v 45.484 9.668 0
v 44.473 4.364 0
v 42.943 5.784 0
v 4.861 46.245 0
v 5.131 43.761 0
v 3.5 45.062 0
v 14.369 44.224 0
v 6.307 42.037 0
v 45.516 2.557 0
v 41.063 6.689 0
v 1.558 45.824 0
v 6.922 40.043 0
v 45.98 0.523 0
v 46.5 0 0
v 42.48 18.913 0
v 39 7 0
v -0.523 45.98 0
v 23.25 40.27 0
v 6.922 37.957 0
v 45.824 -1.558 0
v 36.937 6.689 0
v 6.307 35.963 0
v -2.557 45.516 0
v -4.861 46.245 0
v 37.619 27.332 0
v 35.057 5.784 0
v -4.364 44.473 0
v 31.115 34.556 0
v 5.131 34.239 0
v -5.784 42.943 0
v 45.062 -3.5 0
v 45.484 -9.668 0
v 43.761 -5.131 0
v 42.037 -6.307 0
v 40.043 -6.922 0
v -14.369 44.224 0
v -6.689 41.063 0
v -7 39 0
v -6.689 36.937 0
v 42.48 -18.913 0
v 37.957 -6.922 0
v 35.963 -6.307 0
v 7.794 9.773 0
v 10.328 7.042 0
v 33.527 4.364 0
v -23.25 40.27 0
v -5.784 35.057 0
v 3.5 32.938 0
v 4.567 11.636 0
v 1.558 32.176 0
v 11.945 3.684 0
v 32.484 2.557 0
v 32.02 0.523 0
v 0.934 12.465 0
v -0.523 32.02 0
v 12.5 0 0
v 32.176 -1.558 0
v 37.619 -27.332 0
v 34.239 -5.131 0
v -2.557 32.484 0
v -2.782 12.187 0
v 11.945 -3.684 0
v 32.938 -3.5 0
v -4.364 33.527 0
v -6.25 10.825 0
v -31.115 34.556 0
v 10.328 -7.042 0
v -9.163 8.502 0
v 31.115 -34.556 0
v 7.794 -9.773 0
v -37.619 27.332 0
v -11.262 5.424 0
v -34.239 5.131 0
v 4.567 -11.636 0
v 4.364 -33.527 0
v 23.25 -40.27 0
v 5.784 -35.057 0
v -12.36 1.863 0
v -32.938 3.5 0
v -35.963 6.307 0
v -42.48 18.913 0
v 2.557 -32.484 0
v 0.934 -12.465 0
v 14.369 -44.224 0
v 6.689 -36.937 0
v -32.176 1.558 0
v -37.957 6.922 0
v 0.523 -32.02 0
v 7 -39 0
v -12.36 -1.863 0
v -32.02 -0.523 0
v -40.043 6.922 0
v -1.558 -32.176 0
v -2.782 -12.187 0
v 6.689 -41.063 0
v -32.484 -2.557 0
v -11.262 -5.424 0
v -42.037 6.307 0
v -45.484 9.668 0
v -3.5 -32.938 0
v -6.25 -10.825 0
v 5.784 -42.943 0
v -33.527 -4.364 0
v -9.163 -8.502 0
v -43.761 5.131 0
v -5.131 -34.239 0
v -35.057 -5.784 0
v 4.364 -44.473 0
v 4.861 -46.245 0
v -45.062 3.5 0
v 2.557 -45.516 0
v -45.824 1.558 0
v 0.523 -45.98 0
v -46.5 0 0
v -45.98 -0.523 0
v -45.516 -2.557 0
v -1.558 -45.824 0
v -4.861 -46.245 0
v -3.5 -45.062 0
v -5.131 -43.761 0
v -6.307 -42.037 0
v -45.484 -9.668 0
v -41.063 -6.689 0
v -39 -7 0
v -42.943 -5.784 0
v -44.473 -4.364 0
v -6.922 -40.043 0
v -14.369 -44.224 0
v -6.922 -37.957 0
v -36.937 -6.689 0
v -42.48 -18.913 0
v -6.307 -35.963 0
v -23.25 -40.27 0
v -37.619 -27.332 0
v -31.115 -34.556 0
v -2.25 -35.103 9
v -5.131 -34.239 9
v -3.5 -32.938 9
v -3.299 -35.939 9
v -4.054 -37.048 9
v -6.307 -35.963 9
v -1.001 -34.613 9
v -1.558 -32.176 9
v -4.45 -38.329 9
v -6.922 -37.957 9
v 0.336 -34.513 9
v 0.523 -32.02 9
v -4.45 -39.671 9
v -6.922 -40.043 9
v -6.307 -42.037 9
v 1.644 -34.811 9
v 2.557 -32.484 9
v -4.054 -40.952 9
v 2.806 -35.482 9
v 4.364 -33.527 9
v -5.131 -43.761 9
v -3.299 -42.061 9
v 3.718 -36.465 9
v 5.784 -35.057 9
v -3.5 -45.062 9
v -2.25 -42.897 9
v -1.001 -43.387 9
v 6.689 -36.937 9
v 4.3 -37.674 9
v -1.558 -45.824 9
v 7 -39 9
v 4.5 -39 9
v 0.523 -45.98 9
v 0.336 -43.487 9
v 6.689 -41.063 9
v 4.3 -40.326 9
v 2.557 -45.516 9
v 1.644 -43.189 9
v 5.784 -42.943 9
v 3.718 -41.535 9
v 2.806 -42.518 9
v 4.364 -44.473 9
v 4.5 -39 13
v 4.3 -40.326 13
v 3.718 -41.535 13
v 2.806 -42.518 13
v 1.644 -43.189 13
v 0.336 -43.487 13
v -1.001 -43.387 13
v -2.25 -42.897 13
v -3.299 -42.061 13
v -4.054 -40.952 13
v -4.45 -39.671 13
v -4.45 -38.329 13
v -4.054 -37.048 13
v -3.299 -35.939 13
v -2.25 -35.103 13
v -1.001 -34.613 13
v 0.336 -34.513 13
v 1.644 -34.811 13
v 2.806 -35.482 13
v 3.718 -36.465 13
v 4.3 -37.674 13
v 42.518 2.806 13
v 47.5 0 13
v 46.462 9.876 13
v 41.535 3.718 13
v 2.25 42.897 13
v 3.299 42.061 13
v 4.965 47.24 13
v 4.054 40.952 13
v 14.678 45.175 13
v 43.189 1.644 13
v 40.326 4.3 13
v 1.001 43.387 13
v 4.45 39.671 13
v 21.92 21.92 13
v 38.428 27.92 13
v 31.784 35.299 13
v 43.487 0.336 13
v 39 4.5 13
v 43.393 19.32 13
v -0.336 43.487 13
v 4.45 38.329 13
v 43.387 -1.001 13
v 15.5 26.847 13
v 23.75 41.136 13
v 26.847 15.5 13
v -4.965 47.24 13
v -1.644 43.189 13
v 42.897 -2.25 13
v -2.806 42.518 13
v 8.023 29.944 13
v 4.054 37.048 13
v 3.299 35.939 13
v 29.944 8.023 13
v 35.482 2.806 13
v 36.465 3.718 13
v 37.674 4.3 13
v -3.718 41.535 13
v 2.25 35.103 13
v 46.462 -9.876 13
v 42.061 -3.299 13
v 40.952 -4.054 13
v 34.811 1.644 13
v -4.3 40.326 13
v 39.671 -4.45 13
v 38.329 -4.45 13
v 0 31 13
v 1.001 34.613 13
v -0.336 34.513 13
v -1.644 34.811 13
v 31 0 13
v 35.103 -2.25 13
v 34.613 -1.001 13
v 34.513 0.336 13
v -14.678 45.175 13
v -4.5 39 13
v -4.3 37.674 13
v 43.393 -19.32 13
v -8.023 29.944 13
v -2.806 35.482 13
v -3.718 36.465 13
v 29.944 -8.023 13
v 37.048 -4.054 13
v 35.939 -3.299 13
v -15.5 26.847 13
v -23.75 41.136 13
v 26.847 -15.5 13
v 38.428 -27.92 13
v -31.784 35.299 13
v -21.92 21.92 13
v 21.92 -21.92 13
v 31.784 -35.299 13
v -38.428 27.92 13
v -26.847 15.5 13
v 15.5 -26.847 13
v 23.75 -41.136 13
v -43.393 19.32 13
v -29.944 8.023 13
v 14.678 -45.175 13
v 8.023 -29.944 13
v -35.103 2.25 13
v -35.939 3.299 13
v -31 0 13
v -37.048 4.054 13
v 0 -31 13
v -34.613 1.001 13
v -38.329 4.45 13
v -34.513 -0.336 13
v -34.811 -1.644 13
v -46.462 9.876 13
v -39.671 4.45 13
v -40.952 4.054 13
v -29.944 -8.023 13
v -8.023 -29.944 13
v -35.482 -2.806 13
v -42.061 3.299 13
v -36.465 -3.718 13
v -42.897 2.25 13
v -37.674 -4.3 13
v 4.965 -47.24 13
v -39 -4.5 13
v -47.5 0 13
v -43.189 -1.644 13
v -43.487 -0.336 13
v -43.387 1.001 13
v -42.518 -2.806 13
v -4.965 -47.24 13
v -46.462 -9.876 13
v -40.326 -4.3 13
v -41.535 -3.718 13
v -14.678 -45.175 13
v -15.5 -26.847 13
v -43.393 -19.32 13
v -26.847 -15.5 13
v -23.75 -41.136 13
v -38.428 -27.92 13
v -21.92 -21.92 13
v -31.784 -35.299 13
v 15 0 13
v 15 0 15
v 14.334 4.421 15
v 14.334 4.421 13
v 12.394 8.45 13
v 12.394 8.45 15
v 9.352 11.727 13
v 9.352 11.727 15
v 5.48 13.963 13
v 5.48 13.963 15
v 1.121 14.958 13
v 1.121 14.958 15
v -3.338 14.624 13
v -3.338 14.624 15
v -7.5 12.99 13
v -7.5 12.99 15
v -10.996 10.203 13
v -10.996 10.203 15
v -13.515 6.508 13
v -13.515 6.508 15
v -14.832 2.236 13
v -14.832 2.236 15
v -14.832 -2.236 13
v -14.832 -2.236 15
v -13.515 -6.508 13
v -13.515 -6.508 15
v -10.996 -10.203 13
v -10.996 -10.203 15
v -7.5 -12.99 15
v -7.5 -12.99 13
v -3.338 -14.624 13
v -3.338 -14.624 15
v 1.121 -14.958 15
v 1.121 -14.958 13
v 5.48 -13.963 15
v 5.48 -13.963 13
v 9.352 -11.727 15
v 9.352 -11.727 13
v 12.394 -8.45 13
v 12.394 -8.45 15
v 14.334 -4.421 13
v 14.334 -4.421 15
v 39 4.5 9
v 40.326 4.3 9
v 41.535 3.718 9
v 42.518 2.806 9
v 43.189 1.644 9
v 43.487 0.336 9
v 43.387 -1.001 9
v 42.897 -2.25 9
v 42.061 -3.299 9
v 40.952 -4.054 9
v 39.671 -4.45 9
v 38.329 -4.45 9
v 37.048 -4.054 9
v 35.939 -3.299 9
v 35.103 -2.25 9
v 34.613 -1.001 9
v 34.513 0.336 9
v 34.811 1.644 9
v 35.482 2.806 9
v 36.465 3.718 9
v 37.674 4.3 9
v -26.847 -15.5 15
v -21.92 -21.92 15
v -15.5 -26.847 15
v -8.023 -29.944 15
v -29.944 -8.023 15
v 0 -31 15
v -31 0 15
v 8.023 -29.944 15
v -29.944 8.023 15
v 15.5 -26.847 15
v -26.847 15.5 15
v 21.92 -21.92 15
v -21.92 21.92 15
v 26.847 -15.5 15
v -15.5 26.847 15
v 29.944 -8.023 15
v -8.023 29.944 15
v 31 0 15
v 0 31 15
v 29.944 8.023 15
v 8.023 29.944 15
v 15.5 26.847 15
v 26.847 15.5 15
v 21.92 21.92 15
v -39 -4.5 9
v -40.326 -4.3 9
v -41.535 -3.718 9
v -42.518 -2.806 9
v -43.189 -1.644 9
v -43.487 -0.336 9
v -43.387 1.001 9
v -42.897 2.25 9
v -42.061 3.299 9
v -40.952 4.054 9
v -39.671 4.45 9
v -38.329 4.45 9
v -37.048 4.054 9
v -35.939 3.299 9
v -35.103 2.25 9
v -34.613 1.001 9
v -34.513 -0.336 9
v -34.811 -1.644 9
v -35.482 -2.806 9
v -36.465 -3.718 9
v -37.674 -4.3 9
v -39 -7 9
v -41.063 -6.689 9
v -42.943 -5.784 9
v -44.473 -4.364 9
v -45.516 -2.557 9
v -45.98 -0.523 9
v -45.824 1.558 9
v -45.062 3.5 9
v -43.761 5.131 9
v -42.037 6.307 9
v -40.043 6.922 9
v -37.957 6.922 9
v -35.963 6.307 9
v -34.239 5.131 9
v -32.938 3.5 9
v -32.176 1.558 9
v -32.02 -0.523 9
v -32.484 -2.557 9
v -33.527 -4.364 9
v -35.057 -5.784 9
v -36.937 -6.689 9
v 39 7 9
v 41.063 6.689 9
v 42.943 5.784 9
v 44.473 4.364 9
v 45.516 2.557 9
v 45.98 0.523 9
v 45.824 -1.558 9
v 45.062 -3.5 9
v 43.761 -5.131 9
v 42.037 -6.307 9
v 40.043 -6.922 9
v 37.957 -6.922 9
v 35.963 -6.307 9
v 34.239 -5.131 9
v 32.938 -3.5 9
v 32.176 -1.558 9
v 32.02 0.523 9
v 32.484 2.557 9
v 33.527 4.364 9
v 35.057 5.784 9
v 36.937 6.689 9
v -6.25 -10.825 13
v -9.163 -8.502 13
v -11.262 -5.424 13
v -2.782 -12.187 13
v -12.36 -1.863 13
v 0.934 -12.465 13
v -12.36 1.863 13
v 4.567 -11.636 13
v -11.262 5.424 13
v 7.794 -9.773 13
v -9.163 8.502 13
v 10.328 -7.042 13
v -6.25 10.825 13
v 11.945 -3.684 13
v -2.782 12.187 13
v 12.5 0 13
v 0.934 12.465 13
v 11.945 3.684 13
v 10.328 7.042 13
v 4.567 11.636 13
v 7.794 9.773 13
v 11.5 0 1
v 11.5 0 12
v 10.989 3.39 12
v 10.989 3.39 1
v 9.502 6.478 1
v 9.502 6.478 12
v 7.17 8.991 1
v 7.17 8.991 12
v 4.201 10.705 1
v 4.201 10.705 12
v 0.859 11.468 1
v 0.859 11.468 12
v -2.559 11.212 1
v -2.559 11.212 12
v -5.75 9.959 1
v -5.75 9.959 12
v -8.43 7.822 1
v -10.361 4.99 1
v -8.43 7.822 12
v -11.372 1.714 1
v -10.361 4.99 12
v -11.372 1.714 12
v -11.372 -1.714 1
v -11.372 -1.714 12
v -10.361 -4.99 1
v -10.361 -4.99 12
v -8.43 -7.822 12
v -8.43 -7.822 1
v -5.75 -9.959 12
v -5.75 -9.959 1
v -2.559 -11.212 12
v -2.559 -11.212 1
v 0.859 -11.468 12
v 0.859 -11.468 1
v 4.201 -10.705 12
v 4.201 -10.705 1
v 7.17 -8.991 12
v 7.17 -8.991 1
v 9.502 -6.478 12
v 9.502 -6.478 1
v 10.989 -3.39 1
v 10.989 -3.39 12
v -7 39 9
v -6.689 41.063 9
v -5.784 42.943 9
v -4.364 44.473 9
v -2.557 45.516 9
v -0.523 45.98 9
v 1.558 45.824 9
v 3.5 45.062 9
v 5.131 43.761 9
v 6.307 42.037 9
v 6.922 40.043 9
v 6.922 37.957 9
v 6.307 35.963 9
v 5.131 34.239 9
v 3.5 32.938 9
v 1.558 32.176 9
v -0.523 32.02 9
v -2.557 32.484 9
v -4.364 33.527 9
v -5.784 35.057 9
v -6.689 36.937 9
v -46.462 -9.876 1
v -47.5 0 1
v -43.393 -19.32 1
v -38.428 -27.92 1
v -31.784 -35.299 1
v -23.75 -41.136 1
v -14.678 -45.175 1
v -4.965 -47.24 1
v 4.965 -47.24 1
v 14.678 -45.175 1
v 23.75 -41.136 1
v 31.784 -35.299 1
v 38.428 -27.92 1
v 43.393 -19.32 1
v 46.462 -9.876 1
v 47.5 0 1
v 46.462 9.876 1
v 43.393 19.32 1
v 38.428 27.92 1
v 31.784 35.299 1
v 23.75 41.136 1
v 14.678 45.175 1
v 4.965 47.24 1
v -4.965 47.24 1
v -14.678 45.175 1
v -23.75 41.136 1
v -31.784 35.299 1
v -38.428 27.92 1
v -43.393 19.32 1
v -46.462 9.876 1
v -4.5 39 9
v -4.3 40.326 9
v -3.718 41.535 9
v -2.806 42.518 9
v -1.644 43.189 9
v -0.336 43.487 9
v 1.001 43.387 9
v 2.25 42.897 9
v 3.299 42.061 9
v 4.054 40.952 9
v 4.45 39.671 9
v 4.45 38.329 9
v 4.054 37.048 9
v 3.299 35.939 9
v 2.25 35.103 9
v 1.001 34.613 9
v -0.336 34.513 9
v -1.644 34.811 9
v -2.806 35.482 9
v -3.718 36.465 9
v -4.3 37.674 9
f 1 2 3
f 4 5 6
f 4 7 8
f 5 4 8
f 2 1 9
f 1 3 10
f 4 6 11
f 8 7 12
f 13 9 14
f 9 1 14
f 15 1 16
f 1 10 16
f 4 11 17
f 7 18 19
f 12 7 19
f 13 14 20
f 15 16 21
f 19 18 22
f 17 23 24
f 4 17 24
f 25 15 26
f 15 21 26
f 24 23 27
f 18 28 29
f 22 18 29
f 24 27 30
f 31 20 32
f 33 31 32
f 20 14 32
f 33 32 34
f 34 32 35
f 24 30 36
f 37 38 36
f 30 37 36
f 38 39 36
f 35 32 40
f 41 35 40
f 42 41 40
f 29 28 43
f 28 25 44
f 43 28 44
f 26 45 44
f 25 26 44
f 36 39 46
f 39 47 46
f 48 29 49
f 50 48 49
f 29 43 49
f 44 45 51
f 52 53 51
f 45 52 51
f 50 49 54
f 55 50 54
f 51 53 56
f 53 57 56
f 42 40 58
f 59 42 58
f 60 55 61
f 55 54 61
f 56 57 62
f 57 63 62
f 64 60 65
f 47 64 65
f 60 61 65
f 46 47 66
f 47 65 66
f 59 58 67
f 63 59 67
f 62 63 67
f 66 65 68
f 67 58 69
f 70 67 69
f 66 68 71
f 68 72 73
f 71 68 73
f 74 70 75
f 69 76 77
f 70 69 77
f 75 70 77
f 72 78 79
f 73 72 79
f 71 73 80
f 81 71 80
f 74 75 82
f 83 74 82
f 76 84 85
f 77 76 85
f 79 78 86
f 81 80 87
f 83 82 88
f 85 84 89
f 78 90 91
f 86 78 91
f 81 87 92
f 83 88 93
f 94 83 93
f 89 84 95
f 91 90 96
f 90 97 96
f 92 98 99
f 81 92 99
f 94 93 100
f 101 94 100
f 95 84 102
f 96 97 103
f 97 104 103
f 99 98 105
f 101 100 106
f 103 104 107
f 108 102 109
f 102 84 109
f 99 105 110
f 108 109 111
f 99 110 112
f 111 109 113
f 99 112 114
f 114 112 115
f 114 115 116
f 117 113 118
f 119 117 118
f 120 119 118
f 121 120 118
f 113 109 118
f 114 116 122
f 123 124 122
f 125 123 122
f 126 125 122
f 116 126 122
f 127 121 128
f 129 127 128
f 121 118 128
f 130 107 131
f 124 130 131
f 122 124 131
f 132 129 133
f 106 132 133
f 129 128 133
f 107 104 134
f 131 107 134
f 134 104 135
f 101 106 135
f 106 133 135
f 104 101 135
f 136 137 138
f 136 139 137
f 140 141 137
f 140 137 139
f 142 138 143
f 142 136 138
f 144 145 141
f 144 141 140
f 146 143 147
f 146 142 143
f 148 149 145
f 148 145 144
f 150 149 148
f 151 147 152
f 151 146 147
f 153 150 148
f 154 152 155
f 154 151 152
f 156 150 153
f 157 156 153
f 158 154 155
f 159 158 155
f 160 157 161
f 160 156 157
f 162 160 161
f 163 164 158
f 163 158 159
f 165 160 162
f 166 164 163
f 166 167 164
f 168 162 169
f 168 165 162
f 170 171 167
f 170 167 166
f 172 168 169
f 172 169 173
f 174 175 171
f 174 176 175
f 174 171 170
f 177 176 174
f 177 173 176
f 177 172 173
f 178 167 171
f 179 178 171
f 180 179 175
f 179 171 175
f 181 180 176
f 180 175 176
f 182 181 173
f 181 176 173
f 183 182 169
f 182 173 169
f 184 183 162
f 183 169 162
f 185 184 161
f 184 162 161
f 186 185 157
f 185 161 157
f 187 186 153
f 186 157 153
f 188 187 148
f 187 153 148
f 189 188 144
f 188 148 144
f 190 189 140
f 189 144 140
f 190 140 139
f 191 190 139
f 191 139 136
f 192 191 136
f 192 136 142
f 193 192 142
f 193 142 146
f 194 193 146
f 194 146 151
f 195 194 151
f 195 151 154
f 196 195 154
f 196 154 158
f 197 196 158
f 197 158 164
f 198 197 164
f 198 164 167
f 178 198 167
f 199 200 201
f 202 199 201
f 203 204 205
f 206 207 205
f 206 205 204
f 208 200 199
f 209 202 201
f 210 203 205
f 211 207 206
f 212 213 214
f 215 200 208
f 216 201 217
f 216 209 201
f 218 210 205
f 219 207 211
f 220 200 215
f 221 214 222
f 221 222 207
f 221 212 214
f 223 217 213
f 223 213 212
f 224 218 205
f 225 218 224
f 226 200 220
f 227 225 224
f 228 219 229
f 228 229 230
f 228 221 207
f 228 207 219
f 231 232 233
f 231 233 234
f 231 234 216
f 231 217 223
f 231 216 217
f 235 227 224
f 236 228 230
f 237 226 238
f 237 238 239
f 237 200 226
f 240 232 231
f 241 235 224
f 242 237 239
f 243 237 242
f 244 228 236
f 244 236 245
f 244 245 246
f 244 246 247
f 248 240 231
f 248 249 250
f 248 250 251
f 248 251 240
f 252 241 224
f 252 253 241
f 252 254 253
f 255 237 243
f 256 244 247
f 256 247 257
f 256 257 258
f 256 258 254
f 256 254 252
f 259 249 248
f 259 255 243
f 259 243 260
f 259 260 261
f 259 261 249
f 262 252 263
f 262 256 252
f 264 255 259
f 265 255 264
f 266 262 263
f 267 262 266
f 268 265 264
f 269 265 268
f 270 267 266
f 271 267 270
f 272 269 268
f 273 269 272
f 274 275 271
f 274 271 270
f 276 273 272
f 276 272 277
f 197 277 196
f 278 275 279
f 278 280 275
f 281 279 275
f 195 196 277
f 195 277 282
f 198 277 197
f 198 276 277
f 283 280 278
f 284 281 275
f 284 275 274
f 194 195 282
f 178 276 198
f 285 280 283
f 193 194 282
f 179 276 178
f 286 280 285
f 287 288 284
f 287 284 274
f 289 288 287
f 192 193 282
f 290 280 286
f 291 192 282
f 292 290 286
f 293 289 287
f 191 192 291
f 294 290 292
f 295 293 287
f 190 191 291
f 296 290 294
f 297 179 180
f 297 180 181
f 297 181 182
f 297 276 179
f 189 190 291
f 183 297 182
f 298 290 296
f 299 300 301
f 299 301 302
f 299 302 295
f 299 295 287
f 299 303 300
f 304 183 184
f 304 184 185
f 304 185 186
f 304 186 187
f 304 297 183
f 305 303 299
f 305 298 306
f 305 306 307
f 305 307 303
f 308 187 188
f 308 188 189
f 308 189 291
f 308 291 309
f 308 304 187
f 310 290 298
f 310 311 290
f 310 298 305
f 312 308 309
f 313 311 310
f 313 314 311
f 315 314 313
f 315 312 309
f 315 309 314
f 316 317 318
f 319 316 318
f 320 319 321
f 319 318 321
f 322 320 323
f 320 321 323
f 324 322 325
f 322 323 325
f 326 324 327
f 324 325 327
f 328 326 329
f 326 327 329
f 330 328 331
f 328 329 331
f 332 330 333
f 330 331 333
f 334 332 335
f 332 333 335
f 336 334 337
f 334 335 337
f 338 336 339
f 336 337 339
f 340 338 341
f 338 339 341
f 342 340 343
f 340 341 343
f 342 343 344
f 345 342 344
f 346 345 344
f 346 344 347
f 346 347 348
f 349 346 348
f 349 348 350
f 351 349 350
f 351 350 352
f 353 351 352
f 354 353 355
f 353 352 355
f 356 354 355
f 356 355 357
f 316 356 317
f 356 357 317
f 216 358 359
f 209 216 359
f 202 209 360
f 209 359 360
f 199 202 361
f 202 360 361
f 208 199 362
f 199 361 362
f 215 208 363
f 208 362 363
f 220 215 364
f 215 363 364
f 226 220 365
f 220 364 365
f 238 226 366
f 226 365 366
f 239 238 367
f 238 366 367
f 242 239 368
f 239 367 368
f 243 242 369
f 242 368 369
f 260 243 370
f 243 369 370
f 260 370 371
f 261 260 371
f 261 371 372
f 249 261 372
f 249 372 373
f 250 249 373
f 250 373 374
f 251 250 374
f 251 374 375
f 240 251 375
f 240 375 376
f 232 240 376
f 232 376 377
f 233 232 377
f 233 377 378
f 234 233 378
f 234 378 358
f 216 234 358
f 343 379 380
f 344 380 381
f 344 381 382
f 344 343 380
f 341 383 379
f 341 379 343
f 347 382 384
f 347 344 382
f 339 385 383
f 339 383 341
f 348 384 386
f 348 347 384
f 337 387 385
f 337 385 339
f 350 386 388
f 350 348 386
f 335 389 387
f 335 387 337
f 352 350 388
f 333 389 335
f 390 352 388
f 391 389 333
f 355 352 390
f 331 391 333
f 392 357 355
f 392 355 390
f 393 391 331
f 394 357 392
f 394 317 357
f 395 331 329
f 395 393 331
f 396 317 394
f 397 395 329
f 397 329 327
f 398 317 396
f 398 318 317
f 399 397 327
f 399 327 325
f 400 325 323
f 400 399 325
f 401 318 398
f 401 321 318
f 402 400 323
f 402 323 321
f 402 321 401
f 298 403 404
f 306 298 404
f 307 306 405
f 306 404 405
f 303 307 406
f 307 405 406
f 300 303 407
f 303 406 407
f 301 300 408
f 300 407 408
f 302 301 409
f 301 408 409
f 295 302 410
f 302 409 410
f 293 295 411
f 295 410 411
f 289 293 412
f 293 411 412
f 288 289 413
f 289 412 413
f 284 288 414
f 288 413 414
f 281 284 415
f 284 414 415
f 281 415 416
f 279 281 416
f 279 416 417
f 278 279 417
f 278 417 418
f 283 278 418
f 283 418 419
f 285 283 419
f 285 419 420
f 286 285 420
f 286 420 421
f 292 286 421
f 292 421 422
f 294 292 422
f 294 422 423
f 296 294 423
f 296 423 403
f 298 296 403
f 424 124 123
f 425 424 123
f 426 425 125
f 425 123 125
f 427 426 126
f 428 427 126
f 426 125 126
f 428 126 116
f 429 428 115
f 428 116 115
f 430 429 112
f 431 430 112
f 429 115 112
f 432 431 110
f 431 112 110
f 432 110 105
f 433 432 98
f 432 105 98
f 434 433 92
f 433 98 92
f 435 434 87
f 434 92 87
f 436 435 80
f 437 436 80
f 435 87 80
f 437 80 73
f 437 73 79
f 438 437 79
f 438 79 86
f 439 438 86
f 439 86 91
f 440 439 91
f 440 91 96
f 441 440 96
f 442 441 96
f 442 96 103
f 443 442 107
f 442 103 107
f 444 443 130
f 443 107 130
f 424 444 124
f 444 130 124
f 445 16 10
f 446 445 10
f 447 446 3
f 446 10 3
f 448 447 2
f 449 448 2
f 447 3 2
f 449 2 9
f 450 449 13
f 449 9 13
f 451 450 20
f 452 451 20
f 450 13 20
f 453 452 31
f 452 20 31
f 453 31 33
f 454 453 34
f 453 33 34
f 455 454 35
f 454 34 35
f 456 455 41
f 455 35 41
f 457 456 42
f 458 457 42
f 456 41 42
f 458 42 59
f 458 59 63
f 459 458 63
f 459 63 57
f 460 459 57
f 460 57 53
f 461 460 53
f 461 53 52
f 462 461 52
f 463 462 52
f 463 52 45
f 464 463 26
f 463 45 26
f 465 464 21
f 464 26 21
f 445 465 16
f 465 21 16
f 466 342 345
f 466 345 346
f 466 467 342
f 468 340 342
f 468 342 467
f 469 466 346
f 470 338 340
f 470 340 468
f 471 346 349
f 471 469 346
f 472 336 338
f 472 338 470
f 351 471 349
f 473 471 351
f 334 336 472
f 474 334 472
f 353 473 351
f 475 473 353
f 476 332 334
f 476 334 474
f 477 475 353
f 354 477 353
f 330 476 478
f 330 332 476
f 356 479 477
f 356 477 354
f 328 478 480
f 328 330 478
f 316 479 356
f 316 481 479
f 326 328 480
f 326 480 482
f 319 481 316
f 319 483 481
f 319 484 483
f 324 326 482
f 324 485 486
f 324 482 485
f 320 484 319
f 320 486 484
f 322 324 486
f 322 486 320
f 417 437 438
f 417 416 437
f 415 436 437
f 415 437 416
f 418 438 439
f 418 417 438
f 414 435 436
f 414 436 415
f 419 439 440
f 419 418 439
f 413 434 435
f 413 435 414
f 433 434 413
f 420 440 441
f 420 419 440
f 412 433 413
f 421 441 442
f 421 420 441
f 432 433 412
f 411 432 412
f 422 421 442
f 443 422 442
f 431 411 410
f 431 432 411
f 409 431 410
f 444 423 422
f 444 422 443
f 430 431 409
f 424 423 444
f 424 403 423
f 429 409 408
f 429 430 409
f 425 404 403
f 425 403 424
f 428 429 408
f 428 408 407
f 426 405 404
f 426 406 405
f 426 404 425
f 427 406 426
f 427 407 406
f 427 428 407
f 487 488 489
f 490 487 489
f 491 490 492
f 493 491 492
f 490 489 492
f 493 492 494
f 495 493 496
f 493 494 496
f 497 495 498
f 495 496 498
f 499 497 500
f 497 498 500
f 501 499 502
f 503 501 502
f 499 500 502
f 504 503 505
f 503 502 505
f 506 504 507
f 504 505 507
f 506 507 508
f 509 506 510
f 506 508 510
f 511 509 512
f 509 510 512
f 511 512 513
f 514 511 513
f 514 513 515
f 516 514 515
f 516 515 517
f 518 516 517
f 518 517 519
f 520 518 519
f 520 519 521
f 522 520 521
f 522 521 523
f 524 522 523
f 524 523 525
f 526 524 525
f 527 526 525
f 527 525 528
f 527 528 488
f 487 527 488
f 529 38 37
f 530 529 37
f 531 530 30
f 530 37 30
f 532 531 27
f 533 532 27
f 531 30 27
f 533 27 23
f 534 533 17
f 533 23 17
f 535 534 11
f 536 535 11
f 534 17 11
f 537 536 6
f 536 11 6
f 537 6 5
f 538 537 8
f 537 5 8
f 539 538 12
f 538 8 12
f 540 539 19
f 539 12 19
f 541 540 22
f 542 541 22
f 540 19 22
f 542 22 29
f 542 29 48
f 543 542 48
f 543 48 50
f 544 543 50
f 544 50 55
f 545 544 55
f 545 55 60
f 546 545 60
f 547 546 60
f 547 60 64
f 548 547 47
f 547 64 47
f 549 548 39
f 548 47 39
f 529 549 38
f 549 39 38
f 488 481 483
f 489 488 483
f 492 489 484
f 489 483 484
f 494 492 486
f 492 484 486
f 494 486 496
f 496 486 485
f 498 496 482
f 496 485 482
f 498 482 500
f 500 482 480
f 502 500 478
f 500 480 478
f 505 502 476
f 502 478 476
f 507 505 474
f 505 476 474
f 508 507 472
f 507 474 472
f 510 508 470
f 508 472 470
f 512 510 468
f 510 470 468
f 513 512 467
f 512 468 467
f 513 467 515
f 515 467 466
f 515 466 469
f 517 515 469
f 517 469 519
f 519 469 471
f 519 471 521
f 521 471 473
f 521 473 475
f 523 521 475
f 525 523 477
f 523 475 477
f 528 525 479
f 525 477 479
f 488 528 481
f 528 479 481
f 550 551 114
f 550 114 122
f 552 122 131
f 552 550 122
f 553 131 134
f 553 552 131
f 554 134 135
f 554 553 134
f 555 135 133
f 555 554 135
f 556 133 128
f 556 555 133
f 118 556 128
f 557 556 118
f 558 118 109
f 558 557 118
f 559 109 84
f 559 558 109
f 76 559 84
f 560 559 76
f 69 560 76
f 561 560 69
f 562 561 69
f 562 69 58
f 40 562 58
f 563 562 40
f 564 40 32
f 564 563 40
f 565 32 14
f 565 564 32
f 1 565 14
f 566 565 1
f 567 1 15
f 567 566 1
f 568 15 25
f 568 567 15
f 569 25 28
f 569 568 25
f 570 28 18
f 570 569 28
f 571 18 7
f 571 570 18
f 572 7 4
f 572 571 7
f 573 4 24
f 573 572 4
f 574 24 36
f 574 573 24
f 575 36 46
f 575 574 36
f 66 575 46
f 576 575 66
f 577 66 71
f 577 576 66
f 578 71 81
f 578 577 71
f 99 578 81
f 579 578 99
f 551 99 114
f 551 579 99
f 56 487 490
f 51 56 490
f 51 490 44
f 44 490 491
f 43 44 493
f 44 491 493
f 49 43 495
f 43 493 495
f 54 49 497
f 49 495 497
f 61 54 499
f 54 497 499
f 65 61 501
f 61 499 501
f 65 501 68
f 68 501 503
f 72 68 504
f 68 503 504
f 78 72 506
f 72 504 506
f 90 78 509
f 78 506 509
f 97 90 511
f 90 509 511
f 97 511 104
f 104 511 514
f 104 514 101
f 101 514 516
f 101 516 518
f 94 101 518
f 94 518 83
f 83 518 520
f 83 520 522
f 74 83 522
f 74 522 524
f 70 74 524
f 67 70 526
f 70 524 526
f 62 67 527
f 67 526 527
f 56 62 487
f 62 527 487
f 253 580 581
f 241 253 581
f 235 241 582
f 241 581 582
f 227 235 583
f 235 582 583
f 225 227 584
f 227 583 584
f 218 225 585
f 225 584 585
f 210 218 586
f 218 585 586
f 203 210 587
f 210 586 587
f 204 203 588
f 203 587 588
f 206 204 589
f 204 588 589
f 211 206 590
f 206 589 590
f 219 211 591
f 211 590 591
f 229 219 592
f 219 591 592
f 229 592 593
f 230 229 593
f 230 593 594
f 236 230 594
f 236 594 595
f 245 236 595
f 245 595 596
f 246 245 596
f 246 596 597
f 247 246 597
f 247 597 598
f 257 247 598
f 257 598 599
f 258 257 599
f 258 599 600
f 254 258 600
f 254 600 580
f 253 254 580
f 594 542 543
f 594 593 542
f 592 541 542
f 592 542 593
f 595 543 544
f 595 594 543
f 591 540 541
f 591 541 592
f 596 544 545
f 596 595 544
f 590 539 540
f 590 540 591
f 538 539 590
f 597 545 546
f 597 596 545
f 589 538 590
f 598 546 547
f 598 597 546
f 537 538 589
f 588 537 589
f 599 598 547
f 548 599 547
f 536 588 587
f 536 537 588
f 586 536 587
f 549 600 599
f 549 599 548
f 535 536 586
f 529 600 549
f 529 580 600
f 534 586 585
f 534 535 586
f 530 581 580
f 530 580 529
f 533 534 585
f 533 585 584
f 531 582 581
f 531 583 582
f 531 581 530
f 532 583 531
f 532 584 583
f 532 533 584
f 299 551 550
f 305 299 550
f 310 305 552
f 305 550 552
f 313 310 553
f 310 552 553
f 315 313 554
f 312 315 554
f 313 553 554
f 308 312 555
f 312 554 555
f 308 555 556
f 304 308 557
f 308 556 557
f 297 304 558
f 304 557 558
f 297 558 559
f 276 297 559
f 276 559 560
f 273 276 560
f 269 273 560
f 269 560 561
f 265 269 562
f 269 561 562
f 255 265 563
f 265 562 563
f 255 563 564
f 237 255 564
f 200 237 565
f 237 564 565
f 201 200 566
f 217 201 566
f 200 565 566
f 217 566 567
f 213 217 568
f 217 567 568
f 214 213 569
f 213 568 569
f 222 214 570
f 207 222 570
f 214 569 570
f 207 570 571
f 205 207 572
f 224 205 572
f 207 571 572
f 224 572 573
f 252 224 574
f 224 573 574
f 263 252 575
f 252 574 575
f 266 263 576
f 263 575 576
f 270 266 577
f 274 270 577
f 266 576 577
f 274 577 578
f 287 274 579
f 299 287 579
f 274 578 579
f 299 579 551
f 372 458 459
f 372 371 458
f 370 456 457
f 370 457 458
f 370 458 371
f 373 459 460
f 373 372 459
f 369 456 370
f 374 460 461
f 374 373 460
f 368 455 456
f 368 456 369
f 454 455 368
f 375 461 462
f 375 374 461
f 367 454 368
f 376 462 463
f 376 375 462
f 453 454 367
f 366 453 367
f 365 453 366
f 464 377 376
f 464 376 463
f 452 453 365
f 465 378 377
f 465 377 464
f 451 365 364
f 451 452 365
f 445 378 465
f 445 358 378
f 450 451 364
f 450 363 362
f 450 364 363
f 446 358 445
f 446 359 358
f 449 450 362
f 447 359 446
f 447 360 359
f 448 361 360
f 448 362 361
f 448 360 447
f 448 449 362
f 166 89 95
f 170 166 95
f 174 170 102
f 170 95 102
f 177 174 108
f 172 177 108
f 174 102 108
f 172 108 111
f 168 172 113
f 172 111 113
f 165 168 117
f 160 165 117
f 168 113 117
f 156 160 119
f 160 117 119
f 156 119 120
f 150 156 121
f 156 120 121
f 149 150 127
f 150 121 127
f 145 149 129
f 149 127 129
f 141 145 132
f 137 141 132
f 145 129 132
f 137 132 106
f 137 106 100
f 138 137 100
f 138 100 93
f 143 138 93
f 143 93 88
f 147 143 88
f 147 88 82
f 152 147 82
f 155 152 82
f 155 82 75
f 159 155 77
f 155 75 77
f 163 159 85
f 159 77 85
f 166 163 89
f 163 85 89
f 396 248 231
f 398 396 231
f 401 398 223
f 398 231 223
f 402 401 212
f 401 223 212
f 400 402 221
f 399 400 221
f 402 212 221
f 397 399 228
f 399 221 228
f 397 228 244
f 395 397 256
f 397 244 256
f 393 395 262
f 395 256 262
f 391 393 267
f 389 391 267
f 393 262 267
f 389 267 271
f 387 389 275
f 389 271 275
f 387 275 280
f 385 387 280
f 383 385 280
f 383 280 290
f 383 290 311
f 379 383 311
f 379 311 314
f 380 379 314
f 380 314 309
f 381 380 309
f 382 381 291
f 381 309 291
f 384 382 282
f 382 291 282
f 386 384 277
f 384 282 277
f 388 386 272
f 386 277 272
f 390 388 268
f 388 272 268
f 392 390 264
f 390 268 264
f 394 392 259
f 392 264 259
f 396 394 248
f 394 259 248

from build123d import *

# Parameters (mm, degrees)
SKETCH_1_R               = 47.5
EXTRUDE_1_DEPTH          = 13
SKETCH_2_R               = 31
EXTRUDE_2_DEPTH          = 2
SKETCH_3_R               = 15
CUT_EXTRUDE_2_DEPTH      = 2
SKETCH_6_R               = 11.5
CUT_EXTRUDE_3_DEPTH      = 69.421487853
CHAMFER_1_SIZE           = 1
SKETCH_7_R               = 7
CUT_EXTRUDE_4_DEPTH      = 9
SKETCH_8_R               = 4.5
CUT_EXTRUDE_5_DEPTH      = 68.775364256
PATTERN_CIRCULAR_1_COUNT = 4
CHAMFER_2_SIZE           = 1


with BuildPart() as part:
    # 草图1 → 凸台-拉伸1 (new body)
    with BuildSketch(Plane.XY):
        with Locations(Location((0, 0, 0), (0, 0, 180))):
            Circle(SKETCH_1_R)
    extrude(amount=EXTRUDE_1_DEPTH)

    # 草图2 → 凸台-拉伸2 (add)
    with BuildSketch(Plane.XY.offset(13)):
        Circle(SKETCH_2_R)
    extrude(amount=EXTRUDE_2_DEPTH)

    # 草图3 → 切除-拉伸2 (cut)
    with BuildSketch(Plane.XY.offset(15)):
        Circle(SKETCH_3_R)
    extrude(amount=-CUT_EXTRUDE_2_DEPTH, mode=Mode.SUBTRACT)

    # 草图6 → 切除-拉伸3 (cut, through all)
    with BuildSketch(Plane.XY.offset(13)):
        Circle(SKETCH_6_R)
    extrude(amount=-CUT_EXTRUDE_3_DEPTH, mode=Mode.SUBTRACT)

    # 倒角1
    chamfer_1_edges = [part.edges().sort_by_distance(p)[0] for p in [
        (-11.5, 0, 0),
        (-11.5, 0, 13),
    ]]
    chamfer(chamfer_1_edges, length=CHAMFER_1_SIZE)

    # 草图7 → 切除-拉伸4 (cut)
    with BuildSketch(Plane(origin=(0, 0, 0), x_dir=(-1, 0, 0), z_dir=(0, 0, -1))):
        with Locations((0, 39)):
            Circle(SKETCH_7_R)
    cut_extrude_4 = extrude(amount=-CUT_EXTRUDE_4_DEPTH, mode=Mode.SUBTRACT)

    # 草图8 → 切除-拉伸5 (cut, through all)
    with BuildSketch(Plane(origin=(0, 0, 9), x_dir=(-1, 0, 0), z_dir=(0, 0, -1))):
        with Locations((0, 39)):
            Circle(SKETCH_8_R)
    cut_extrude_5 = extrude(amount=-CUT_EXTRUDE_5_DEPTH, mode=Mode.SUBTRACT)

    # 阵列(圆周)1: 切除-拉伸4, 切除-拉伸5 ×4 about axis
    pattern_circular_1_axis = Axis((0, 0, 0), (0, 0, 1))
    add([cut_extrude_4.rotate(pattern_circular_1_axis, i * 360 / PATTERN_CIRCULAR_1_COUNT) for i in range(1, PATTERN_CIRCULAR_1_COUNT)], mode=Mode.SUBTRACT)
    add([cut_extrude_5.rotate(pattern_circular_1_axis, i * 360 / PATTERN_CIRCULAR_1_COUNT) for i in range(1, PATTERN_CIRCULAR_1_COUNT)], mode=Mode.SUBTRACT)

    # 倒角2
    chamfer_2_edges = [part.edges().sort_by_distance(p)[0] for p in [
        (47.5, 0, 0),
    ]]
    chamfer(chamfer_2_edges, length=CHAMFER_2_SIZE)


solid = part.part
